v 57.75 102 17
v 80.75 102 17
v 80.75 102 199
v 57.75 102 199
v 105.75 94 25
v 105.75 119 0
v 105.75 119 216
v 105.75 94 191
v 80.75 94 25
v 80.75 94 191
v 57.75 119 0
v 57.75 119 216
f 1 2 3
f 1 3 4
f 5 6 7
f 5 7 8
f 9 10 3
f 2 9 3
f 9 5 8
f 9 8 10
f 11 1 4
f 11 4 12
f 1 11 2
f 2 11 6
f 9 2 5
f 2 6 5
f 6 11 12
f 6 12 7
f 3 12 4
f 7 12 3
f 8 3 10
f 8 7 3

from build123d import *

# Parameters (mm, degrees)
BOSS_EXTRU_1_DEPTH      = 216
ENL_V_MAT_EXTRU_1_DEPTH = 49


with BuildPart() as part:
    # Esquisse1 → Boss.-Extru.1 (new body)
    with BuildSketch(Plane.XY):
        Polygon((105.75, 119), (105.75, 94), (80.75, 94), (80.75, 102), (57.75, 102), (57.75, 119), align=None)
    extrude(amount=BOSS_EXTRU_1_DEPTH)

    # Esquisse3 → Enlèv. mat.-Extru.1 (cut, through all)
    with BuildSketch(Plane(origin=(105.75, 0, 0), x_dir=(0, 0, -1), z_dir=(1, 0, 0))):
        Polygon((0, 119), (-25, 94), (0, 94), align=None)
        Polygon((-191, 94), (-216, 94), (-216, 119), align=None)
    extrude(amount=-ENL_V_MAT_EXTRU_1_DEPTH, mode=Mode.SUBTRACT)


solid = part.part
